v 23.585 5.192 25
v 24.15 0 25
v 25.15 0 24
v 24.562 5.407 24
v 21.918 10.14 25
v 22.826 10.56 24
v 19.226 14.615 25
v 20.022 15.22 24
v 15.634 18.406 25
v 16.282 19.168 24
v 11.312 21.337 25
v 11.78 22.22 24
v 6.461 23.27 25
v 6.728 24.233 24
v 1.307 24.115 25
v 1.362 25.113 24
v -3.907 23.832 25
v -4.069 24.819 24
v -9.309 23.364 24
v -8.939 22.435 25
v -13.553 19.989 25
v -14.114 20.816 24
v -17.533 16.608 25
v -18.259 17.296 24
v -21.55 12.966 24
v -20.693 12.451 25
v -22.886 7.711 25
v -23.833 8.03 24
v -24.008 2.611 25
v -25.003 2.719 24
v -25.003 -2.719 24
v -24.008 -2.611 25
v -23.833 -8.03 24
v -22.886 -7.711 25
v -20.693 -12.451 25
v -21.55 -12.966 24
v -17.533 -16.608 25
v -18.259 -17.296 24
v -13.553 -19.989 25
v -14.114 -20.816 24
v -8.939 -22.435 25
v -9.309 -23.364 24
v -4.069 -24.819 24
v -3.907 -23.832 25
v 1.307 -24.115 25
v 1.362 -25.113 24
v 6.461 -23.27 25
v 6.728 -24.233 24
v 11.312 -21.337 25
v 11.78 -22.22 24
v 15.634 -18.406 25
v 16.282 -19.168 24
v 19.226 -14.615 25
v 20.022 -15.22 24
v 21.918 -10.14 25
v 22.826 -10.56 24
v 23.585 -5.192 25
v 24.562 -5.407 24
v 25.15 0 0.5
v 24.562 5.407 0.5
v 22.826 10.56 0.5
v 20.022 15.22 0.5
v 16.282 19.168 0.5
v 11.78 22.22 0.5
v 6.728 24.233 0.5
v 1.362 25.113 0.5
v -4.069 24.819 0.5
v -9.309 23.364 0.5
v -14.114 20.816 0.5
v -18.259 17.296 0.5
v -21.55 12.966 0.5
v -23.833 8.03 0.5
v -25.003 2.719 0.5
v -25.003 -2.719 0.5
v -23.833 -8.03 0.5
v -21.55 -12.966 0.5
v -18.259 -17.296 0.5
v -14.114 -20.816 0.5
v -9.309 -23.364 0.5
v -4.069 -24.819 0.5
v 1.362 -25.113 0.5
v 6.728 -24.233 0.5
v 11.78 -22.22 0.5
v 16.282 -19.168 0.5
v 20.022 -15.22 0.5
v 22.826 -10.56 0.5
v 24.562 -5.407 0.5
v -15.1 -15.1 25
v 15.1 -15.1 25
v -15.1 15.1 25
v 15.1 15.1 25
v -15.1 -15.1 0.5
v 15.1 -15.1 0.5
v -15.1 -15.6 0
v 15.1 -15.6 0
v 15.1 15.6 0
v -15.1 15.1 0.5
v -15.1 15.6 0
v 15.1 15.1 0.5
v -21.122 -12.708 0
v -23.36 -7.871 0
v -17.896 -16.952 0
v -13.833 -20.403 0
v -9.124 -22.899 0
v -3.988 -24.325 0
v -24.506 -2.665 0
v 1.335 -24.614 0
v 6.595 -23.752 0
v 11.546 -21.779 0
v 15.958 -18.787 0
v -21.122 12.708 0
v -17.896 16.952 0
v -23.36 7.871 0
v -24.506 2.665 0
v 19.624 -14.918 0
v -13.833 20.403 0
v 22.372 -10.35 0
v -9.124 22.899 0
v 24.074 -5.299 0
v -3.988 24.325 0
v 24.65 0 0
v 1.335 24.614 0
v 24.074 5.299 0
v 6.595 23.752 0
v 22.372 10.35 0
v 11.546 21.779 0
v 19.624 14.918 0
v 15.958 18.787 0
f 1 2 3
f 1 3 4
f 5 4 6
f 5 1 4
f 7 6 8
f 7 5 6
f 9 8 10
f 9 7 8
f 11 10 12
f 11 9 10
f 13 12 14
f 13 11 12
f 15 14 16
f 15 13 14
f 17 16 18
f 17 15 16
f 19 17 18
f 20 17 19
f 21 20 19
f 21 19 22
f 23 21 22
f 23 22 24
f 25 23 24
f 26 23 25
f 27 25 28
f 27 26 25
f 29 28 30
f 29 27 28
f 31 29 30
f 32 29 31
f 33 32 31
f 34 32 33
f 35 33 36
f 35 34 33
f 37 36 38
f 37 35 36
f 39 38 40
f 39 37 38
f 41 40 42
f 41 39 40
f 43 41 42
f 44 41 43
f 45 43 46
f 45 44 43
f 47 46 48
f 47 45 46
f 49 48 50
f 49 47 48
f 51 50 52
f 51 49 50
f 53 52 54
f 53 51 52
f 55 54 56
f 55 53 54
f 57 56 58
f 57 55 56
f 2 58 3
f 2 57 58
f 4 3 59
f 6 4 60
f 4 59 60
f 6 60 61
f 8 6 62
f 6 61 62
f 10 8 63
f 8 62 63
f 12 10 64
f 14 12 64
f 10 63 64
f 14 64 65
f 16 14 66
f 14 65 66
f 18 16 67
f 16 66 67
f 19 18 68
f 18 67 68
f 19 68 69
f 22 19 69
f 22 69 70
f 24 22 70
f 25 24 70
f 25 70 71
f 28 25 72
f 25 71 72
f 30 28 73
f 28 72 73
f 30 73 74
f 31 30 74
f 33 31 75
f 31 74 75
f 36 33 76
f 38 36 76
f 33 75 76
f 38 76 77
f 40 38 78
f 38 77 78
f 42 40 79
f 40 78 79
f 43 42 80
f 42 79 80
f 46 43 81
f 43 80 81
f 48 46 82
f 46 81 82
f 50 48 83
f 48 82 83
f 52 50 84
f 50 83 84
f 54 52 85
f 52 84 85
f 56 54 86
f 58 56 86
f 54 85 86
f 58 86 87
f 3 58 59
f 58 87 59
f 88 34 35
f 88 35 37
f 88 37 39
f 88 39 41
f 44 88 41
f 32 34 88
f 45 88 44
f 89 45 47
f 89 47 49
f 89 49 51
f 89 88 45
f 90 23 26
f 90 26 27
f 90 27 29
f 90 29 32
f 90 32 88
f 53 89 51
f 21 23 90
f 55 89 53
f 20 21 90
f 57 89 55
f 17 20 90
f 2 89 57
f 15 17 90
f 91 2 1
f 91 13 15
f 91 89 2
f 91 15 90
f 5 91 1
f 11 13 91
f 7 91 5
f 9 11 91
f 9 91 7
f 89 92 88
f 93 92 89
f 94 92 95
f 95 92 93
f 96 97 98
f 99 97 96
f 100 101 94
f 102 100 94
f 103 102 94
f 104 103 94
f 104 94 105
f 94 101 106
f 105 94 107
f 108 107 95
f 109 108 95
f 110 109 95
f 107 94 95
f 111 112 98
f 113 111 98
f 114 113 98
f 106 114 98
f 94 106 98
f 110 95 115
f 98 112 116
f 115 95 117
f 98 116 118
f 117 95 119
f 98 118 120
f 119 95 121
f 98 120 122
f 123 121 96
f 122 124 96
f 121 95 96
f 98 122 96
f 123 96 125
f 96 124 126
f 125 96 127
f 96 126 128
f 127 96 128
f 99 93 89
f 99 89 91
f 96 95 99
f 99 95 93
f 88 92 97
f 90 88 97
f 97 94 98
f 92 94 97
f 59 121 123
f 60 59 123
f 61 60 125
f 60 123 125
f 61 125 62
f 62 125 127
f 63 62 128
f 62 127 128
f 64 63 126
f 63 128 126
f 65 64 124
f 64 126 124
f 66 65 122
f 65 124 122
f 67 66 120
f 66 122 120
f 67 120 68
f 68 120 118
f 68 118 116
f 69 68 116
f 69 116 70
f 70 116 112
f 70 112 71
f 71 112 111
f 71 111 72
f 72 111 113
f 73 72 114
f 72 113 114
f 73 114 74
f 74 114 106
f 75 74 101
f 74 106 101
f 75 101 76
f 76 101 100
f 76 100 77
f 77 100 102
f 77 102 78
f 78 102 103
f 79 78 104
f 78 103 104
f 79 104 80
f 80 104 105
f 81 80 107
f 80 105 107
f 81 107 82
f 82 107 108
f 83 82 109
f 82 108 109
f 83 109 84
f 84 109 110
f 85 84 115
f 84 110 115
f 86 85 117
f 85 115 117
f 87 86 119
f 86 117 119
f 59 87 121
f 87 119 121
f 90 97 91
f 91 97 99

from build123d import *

# Parameters (mm, degrees)
BOX717_W           = 30.2
BOX717_H           = 30.2
BOX717_DEPTH       = 25
CYLINDER1805_R     = 25.15
CYLINDER1805_DEPTH = 25
CHAMFER067_SIZE    = 0.5
CHAMFER066_SIZE    = 1
CHAMFER068_SIZE    = 0.5


with BuildPart() as krychle717:
    # Box717 → Box717 (new body)
    with BuildSketch(Plane(origin=(-15.1, -15.1, 0), x_dir=(1, 0, 0), z_dir=(0, 0, 1))):
        with Locations((15.1, 15.1)):
            Rectangle(BOX717_W, BOX717_H)
    extrude(amount=BOX717_DEPTH)


with BuildPart() as chamfer068:
    # Cylinder1805 → Cylinder1805 (new body)
    with BuildSketch(Plane.XY):
        Circle(CYLINDER1805_R)
    extrude(amount=CYLINDER1805_DEPTH)

    # Cut531: cut Krychle717
    add(krychle717.part, mode=Mode.SUBTRACT)

    # Chamfer067
    chamfer067_edges = [chamfer068.edges().sort_by_distance(p)[0] for p in [
        (0, -15.1, 0),
        (0, 15.1, 0),
    ]]
    chamfer(chamfer067_edges, length=CHAMFER067_SIZE)

    # Chamfer066
    chamfer066_edges = [chamfer068.edges().sort_by_distance(p)[0] for p in [
        (-25.15, 0, 25),
    ]]
    chamfer(chamfer066_edges, length=CHAMFER066_SIZE)

    # Chamfer068
    chamfer068_edges = [chamfer068.edges().sort_by_distance(p)[0] for p in [
        (-25.15, 0, 0),
    ]]
    chamfer(chamfer068_edges, length=CHAMFER068_SIZE)


solid = chamfer068.part
